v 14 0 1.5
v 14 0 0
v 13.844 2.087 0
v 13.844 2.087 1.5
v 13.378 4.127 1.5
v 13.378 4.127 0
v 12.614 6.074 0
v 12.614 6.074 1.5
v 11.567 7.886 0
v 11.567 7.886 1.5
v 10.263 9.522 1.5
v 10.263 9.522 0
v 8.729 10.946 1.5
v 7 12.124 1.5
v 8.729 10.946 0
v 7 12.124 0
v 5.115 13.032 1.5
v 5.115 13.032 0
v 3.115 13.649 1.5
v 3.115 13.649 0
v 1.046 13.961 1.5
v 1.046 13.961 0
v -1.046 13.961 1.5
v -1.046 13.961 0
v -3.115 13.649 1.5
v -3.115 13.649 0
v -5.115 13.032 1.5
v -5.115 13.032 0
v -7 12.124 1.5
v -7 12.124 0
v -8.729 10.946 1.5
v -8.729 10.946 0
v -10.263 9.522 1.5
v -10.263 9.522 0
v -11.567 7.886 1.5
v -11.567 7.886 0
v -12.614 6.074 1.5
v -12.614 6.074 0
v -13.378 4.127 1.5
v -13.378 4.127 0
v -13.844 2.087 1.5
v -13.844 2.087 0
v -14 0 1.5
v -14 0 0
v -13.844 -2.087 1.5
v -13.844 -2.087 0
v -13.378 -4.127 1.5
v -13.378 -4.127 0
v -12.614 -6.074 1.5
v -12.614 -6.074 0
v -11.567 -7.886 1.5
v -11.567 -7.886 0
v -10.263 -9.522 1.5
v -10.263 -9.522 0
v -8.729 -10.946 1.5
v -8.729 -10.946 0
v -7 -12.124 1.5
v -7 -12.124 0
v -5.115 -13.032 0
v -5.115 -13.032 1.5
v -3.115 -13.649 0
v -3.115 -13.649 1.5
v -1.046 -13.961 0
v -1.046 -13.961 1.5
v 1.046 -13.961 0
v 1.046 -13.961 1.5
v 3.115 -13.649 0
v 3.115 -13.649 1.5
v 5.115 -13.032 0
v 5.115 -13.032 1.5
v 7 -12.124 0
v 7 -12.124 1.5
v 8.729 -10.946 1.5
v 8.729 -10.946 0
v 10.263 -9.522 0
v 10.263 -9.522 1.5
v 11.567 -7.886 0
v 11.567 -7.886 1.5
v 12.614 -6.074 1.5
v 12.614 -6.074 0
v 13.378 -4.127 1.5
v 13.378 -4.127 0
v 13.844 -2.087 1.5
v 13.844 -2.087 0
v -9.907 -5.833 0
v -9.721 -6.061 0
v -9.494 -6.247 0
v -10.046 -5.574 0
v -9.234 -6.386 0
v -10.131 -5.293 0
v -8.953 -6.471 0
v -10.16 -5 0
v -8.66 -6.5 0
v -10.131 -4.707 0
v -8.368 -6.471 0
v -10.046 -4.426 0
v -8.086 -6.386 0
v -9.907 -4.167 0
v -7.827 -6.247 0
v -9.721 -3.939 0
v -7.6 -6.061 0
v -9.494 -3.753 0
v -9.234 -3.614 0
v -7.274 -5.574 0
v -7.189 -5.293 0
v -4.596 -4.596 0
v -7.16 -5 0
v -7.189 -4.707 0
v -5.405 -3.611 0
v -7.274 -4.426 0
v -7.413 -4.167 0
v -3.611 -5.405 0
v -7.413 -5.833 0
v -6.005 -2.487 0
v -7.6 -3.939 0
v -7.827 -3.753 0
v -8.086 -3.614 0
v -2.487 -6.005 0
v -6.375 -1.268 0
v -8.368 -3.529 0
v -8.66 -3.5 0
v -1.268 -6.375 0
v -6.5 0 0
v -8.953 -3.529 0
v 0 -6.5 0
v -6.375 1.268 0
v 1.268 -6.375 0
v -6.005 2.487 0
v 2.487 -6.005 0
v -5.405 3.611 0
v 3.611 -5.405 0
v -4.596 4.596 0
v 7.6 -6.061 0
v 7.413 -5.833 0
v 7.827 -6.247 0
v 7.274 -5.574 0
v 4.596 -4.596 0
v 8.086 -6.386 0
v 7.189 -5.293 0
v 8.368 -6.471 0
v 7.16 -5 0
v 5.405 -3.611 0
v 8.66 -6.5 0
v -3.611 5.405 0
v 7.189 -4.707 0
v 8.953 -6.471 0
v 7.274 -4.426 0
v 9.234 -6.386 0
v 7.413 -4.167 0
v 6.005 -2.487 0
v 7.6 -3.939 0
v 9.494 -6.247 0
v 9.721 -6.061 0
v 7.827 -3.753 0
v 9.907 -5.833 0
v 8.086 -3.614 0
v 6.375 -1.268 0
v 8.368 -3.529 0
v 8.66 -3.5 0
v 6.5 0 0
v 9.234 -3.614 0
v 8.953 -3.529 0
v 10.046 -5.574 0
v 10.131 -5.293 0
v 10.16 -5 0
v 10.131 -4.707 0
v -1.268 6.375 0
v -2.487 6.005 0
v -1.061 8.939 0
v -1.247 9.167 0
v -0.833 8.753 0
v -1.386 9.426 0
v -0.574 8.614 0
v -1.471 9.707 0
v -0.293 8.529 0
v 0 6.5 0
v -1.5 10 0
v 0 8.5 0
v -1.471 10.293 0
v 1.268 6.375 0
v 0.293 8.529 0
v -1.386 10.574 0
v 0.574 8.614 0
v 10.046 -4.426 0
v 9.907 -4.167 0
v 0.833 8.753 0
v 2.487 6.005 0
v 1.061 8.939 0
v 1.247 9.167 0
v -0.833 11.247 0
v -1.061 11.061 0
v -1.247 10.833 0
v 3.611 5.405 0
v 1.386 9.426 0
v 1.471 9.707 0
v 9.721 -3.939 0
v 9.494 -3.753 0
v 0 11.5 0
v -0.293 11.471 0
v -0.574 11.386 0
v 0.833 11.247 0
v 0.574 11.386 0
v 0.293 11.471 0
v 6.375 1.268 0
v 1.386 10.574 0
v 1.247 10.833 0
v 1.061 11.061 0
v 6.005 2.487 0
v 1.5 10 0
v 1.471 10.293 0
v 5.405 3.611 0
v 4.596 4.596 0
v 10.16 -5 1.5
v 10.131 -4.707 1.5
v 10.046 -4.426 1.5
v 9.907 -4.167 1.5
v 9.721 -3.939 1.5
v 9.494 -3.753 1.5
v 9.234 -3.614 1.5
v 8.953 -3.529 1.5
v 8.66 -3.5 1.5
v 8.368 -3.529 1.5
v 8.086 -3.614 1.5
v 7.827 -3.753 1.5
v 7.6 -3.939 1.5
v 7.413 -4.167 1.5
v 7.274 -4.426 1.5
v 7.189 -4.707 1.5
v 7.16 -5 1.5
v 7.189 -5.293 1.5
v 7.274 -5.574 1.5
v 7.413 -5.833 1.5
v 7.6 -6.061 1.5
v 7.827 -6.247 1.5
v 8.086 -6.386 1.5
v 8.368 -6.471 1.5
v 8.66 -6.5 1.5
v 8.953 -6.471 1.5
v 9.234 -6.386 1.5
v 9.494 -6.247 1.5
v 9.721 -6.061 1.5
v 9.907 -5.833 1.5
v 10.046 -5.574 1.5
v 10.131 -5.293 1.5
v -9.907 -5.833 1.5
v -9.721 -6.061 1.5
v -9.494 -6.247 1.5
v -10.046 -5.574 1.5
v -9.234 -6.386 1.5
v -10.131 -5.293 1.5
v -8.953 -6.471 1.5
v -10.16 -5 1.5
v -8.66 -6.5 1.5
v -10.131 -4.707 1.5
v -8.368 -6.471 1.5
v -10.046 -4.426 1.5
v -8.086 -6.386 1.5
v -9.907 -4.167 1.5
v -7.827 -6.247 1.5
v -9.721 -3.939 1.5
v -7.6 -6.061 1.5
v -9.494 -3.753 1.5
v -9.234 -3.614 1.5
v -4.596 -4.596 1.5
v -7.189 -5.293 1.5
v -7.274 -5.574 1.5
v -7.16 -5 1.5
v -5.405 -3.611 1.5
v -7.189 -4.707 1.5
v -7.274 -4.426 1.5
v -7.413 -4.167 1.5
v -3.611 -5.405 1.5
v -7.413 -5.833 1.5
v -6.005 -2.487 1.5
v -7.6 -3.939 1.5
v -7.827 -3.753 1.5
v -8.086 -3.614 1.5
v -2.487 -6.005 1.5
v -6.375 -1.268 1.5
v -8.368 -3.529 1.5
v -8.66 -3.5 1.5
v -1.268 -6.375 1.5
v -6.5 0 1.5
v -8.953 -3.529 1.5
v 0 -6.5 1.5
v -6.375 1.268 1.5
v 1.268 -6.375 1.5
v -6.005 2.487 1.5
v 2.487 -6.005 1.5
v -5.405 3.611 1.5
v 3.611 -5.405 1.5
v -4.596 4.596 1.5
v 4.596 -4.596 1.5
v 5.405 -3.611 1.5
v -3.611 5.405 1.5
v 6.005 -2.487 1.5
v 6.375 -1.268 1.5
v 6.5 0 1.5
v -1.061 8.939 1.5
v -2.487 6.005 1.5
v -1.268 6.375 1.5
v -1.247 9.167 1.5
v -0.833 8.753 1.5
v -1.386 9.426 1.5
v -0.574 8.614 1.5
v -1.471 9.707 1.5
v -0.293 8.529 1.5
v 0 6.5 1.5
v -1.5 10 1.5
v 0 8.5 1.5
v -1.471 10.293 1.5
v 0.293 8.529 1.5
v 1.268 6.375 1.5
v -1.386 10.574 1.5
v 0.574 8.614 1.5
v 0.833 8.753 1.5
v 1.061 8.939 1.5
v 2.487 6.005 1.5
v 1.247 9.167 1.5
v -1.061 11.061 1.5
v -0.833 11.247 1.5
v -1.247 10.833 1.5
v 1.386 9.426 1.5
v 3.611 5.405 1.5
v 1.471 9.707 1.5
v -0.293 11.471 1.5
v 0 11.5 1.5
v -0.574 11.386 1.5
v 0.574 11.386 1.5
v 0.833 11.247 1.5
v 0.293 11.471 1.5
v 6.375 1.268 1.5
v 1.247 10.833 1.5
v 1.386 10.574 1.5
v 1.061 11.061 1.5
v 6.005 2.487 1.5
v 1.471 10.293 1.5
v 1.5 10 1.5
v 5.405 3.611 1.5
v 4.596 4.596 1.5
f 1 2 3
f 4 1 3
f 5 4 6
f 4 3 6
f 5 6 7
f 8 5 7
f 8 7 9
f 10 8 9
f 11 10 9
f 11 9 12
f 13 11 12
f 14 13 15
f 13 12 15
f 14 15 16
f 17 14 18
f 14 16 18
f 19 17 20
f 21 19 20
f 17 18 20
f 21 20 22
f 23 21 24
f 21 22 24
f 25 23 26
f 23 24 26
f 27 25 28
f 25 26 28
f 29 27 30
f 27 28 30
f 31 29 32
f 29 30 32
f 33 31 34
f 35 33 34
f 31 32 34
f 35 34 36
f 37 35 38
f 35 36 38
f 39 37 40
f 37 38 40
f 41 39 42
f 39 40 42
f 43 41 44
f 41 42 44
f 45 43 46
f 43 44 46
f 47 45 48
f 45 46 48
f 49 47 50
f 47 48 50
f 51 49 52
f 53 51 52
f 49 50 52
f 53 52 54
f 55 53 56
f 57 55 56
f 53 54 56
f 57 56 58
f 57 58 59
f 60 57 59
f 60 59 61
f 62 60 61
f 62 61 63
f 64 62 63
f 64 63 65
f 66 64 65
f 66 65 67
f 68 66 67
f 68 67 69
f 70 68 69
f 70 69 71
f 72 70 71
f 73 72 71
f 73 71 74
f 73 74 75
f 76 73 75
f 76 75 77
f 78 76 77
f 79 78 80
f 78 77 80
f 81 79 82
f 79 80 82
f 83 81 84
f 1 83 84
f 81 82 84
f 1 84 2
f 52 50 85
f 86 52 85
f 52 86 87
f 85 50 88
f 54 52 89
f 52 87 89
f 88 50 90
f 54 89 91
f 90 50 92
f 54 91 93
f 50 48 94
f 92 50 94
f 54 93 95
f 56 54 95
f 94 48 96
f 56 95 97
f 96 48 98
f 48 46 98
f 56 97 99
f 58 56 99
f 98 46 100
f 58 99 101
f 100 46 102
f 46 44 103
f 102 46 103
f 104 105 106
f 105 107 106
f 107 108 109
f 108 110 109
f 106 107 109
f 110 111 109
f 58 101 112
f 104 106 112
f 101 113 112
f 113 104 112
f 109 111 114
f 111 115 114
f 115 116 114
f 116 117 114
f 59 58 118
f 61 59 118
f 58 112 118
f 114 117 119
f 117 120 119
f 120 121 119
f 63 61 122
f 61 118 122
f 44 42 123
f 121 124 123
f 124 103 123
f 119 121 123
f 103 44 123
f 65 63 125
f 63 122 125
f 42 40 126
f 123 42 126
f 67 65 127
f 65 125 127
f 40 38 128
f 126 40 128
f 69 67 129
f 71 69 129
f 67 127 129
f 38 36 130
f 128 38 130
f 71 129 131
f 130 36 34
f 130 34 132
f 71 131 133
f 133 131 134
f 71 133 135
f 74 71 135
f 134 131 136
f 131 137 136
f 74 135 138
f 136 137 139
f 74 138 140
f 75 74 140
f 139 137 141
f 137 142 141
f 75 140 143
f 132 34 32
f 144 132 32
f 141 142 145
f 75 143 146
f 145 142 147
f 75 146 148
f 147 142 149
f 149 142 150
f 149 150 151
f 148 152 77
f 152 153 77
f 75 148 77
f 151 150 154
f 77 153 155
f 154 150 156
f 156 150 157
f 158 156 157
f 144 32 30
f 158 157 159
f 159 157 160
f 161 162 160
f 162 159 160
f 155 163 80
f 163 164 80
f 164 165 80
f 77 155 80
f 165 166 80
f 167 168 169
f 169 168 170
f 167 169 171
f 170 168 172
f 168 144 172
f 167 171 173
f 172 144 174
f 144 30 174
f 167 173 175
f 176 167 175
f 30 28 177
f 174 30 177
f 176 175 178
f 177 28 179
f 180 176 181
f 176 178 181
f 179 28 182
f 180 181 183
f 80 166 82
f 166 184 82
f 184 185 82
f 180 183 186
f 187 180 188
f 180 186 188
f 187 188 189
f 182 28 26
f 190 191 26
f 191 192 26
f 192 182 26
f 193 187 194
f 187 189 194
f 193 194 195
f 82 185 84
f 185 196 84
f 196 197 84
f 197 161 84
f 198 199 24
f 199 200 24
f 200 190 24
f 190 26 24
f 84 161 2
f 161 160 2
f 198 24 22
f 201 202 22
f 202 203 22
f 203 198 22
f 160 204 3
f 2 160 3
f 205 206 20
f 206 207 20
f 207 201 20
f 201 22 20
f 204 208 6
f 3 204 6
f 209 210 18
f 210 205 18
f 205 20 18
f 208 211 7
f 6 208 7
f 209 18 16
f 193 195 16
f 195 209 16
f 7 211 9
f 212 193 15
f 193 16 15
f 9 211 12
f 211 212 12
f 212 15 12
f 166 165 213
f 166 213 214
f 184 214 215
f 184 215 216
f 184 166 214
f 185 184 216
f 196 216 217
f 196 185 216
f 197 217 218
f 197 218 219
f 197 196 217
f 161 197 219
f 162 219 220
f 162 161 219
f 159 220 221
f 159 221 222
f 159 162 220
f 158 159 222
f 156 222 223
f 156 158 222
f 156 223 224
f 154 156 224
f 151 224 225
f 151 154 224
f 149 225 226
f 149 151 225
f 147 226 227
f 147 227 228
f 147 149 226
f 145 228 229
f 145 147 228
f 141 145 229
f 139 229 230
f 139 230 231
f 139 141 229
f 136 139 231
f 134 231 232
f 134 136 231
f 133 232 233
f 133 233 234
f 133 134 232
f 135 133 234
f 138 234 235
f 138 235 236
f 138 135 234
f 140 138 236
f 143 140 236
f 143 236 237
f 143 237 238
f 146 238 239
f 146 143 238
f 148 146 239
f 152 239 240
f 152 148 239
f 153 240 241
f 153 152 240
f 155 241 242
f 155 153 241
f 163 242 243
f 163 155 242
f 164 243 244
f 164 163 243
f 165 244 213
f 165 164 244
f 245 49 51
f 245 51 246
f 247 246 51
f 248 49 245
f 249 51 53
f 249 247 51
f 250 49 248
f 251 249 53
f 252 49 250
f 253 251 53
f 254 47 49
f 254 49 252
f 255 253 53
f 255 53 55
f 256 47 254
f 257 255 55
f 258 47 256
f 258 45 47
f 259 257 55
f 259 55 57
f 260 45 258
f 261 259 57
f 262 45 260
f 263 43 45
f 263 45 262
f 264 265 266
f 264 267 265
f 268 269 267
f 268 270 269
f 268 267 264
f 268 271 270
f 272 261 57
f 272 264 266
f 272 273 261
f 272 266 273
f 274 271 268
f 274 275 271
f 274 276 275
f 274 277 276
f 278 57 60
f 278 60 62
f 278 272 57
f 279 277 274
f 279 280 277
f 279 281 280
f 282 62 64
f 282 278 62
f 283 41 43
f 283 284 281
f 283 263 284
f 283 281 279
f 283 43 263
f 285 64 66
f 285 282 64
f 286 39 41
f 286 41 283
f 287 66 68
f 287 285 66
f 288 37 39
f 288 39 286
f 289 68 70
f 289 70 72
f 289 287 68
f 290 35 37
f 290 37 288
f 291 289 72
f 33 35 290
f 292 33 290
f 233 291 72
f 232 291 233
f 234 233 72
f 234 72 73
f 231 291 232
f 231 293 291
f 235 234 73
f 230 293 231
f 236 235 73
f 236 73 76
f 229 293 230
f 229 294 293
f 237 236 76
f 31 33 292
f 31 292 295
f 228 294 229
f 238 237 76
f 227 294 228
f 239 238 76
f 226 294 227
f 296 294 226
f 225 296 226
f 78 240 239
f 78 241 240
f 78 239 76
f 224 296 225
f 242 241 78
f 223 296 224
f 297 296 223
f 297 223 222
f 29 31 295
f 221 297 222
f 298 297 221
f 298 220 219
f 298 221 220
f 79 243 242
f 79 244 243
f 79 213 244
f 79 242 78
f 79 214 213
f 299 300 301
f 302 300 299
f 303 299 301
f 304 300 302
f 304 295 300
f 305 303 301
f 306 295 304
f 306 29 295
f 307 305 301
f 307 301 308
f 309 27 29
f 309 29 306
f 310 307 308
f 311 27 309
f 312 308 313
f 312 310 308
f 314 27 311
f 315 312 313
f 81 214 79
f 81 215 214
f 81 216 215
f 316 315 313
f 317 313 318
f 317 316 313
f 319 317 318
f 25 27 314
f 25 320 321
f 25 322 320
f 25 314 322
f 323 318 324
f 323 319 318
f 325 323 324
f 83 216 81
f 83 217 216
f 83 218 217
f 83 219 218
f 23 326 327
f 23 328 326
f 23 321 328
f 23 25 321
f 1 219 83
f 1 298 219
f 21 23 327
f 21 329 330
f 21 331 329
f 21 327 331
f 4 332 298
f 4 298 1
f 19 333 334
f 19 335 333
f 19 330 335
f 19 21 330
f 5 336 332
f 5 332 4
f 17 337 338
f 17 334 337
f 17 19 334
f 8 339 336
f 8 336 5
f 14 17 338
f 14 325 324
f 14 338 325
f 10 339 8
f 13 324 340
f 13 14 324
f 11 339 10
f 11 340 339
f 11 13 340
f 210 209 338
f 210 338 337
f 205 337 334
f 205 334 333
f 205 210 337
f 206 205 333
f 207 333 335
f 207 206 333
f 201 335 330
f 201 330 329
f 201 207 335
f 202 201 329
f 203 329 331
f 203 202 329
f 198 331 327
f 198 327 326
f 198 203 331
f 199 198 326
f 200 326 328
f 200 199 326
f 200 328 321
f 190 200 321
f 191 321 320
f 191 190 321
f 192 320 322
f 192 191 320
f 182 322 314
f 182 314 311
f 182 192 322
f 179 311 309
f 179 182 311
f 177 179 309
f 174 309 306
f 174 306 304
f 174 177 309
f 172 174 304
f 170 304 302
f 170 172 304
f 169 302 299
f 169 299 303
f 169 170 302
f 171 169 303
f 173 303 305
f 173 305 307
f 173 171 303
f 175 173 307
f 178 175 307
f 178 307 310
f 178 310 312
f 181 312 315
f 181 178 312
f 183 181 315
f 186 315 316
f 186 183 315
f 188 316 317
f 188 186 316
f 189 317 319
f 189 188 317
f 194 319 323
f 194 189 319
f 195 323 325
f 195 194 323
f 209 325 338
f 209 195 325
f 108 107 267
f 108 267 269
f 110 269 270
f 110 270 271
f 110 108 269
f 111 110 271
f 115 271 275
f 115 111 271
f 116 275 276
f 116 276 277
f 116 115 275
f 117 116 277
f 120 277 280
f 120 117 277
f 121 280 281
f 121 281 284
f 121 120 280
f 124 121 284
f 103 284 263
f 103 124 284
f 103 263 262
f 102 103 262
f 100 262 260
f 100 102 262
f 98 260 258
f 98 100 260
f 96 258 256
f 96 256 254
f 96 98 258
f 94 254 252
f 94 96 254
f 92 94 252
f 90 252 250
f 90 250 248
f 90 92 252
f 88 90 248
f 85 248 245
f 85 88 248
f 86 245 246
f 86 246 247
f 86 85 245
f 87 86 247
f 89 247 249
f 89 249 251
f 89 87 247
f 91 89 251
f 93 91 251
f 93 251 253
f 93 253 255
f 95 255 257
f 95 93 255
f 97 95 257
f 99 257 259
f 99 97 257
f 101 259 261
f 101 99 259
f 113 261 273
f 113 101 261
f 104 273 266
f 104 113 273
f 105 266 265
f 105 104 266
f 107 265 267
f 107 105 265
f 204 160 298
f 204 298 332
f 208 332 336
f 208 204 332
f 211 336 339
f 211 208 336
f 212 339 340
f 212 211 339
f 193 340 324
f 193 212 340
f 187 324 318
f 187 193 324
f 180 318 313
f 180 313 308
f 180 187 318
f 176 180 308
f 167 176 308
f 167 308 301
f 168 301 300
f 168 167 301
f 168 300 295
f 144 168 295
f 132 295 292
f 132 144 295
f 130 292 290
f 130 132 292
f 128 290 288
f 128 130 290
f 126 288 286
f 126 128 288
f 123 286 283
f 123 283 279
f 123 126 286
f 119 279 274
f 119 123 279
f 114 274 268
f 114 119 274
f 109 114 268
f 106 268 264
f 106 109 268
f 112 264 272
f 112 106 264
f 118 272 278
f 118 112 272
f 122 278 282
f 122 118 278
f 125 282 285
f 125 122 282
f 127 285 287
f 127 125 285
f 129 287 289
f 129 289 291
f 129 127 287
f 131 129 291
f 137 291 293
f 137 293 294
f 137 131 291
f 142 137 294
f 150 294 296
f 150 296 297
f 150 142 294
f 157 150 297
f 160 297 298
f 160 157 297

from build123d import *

# Parameters (mm, degrees)
ESBO_O1_R                = 14
ESBO_O1_R_2              = 1.5
ESBO_O1_R_3              = 6.5
RESSALTO_EXTRUS_O1_DEPTH = 1.5


with BuildPart() as part:
    # Esboço1 → Ressalto-extrusão1 (new body)
    with BuildSketch(Plane.XY):
        Circle(ESBO_O1_R)
        with Locations((-8.660254038, -5)):
            Circle(ESBO_O1_R_2, mode=Mode.SUBTRACT)
        with Locations((8.660254038, -5)):
            Circle(ESBO_O1_R_2, mode=Mode.SUBTRACT)
        with Locations((0, 10)):
            Circle(ESBO_O1_R_2, mode=Mode.SUBTRACT)
        Circle(ESBO_O1_R_3, mode=Mode.SUBTRACT)
    extrude(amount=RESSALTO_EXTRUS_O1_DEPTH)


solid = part.part
